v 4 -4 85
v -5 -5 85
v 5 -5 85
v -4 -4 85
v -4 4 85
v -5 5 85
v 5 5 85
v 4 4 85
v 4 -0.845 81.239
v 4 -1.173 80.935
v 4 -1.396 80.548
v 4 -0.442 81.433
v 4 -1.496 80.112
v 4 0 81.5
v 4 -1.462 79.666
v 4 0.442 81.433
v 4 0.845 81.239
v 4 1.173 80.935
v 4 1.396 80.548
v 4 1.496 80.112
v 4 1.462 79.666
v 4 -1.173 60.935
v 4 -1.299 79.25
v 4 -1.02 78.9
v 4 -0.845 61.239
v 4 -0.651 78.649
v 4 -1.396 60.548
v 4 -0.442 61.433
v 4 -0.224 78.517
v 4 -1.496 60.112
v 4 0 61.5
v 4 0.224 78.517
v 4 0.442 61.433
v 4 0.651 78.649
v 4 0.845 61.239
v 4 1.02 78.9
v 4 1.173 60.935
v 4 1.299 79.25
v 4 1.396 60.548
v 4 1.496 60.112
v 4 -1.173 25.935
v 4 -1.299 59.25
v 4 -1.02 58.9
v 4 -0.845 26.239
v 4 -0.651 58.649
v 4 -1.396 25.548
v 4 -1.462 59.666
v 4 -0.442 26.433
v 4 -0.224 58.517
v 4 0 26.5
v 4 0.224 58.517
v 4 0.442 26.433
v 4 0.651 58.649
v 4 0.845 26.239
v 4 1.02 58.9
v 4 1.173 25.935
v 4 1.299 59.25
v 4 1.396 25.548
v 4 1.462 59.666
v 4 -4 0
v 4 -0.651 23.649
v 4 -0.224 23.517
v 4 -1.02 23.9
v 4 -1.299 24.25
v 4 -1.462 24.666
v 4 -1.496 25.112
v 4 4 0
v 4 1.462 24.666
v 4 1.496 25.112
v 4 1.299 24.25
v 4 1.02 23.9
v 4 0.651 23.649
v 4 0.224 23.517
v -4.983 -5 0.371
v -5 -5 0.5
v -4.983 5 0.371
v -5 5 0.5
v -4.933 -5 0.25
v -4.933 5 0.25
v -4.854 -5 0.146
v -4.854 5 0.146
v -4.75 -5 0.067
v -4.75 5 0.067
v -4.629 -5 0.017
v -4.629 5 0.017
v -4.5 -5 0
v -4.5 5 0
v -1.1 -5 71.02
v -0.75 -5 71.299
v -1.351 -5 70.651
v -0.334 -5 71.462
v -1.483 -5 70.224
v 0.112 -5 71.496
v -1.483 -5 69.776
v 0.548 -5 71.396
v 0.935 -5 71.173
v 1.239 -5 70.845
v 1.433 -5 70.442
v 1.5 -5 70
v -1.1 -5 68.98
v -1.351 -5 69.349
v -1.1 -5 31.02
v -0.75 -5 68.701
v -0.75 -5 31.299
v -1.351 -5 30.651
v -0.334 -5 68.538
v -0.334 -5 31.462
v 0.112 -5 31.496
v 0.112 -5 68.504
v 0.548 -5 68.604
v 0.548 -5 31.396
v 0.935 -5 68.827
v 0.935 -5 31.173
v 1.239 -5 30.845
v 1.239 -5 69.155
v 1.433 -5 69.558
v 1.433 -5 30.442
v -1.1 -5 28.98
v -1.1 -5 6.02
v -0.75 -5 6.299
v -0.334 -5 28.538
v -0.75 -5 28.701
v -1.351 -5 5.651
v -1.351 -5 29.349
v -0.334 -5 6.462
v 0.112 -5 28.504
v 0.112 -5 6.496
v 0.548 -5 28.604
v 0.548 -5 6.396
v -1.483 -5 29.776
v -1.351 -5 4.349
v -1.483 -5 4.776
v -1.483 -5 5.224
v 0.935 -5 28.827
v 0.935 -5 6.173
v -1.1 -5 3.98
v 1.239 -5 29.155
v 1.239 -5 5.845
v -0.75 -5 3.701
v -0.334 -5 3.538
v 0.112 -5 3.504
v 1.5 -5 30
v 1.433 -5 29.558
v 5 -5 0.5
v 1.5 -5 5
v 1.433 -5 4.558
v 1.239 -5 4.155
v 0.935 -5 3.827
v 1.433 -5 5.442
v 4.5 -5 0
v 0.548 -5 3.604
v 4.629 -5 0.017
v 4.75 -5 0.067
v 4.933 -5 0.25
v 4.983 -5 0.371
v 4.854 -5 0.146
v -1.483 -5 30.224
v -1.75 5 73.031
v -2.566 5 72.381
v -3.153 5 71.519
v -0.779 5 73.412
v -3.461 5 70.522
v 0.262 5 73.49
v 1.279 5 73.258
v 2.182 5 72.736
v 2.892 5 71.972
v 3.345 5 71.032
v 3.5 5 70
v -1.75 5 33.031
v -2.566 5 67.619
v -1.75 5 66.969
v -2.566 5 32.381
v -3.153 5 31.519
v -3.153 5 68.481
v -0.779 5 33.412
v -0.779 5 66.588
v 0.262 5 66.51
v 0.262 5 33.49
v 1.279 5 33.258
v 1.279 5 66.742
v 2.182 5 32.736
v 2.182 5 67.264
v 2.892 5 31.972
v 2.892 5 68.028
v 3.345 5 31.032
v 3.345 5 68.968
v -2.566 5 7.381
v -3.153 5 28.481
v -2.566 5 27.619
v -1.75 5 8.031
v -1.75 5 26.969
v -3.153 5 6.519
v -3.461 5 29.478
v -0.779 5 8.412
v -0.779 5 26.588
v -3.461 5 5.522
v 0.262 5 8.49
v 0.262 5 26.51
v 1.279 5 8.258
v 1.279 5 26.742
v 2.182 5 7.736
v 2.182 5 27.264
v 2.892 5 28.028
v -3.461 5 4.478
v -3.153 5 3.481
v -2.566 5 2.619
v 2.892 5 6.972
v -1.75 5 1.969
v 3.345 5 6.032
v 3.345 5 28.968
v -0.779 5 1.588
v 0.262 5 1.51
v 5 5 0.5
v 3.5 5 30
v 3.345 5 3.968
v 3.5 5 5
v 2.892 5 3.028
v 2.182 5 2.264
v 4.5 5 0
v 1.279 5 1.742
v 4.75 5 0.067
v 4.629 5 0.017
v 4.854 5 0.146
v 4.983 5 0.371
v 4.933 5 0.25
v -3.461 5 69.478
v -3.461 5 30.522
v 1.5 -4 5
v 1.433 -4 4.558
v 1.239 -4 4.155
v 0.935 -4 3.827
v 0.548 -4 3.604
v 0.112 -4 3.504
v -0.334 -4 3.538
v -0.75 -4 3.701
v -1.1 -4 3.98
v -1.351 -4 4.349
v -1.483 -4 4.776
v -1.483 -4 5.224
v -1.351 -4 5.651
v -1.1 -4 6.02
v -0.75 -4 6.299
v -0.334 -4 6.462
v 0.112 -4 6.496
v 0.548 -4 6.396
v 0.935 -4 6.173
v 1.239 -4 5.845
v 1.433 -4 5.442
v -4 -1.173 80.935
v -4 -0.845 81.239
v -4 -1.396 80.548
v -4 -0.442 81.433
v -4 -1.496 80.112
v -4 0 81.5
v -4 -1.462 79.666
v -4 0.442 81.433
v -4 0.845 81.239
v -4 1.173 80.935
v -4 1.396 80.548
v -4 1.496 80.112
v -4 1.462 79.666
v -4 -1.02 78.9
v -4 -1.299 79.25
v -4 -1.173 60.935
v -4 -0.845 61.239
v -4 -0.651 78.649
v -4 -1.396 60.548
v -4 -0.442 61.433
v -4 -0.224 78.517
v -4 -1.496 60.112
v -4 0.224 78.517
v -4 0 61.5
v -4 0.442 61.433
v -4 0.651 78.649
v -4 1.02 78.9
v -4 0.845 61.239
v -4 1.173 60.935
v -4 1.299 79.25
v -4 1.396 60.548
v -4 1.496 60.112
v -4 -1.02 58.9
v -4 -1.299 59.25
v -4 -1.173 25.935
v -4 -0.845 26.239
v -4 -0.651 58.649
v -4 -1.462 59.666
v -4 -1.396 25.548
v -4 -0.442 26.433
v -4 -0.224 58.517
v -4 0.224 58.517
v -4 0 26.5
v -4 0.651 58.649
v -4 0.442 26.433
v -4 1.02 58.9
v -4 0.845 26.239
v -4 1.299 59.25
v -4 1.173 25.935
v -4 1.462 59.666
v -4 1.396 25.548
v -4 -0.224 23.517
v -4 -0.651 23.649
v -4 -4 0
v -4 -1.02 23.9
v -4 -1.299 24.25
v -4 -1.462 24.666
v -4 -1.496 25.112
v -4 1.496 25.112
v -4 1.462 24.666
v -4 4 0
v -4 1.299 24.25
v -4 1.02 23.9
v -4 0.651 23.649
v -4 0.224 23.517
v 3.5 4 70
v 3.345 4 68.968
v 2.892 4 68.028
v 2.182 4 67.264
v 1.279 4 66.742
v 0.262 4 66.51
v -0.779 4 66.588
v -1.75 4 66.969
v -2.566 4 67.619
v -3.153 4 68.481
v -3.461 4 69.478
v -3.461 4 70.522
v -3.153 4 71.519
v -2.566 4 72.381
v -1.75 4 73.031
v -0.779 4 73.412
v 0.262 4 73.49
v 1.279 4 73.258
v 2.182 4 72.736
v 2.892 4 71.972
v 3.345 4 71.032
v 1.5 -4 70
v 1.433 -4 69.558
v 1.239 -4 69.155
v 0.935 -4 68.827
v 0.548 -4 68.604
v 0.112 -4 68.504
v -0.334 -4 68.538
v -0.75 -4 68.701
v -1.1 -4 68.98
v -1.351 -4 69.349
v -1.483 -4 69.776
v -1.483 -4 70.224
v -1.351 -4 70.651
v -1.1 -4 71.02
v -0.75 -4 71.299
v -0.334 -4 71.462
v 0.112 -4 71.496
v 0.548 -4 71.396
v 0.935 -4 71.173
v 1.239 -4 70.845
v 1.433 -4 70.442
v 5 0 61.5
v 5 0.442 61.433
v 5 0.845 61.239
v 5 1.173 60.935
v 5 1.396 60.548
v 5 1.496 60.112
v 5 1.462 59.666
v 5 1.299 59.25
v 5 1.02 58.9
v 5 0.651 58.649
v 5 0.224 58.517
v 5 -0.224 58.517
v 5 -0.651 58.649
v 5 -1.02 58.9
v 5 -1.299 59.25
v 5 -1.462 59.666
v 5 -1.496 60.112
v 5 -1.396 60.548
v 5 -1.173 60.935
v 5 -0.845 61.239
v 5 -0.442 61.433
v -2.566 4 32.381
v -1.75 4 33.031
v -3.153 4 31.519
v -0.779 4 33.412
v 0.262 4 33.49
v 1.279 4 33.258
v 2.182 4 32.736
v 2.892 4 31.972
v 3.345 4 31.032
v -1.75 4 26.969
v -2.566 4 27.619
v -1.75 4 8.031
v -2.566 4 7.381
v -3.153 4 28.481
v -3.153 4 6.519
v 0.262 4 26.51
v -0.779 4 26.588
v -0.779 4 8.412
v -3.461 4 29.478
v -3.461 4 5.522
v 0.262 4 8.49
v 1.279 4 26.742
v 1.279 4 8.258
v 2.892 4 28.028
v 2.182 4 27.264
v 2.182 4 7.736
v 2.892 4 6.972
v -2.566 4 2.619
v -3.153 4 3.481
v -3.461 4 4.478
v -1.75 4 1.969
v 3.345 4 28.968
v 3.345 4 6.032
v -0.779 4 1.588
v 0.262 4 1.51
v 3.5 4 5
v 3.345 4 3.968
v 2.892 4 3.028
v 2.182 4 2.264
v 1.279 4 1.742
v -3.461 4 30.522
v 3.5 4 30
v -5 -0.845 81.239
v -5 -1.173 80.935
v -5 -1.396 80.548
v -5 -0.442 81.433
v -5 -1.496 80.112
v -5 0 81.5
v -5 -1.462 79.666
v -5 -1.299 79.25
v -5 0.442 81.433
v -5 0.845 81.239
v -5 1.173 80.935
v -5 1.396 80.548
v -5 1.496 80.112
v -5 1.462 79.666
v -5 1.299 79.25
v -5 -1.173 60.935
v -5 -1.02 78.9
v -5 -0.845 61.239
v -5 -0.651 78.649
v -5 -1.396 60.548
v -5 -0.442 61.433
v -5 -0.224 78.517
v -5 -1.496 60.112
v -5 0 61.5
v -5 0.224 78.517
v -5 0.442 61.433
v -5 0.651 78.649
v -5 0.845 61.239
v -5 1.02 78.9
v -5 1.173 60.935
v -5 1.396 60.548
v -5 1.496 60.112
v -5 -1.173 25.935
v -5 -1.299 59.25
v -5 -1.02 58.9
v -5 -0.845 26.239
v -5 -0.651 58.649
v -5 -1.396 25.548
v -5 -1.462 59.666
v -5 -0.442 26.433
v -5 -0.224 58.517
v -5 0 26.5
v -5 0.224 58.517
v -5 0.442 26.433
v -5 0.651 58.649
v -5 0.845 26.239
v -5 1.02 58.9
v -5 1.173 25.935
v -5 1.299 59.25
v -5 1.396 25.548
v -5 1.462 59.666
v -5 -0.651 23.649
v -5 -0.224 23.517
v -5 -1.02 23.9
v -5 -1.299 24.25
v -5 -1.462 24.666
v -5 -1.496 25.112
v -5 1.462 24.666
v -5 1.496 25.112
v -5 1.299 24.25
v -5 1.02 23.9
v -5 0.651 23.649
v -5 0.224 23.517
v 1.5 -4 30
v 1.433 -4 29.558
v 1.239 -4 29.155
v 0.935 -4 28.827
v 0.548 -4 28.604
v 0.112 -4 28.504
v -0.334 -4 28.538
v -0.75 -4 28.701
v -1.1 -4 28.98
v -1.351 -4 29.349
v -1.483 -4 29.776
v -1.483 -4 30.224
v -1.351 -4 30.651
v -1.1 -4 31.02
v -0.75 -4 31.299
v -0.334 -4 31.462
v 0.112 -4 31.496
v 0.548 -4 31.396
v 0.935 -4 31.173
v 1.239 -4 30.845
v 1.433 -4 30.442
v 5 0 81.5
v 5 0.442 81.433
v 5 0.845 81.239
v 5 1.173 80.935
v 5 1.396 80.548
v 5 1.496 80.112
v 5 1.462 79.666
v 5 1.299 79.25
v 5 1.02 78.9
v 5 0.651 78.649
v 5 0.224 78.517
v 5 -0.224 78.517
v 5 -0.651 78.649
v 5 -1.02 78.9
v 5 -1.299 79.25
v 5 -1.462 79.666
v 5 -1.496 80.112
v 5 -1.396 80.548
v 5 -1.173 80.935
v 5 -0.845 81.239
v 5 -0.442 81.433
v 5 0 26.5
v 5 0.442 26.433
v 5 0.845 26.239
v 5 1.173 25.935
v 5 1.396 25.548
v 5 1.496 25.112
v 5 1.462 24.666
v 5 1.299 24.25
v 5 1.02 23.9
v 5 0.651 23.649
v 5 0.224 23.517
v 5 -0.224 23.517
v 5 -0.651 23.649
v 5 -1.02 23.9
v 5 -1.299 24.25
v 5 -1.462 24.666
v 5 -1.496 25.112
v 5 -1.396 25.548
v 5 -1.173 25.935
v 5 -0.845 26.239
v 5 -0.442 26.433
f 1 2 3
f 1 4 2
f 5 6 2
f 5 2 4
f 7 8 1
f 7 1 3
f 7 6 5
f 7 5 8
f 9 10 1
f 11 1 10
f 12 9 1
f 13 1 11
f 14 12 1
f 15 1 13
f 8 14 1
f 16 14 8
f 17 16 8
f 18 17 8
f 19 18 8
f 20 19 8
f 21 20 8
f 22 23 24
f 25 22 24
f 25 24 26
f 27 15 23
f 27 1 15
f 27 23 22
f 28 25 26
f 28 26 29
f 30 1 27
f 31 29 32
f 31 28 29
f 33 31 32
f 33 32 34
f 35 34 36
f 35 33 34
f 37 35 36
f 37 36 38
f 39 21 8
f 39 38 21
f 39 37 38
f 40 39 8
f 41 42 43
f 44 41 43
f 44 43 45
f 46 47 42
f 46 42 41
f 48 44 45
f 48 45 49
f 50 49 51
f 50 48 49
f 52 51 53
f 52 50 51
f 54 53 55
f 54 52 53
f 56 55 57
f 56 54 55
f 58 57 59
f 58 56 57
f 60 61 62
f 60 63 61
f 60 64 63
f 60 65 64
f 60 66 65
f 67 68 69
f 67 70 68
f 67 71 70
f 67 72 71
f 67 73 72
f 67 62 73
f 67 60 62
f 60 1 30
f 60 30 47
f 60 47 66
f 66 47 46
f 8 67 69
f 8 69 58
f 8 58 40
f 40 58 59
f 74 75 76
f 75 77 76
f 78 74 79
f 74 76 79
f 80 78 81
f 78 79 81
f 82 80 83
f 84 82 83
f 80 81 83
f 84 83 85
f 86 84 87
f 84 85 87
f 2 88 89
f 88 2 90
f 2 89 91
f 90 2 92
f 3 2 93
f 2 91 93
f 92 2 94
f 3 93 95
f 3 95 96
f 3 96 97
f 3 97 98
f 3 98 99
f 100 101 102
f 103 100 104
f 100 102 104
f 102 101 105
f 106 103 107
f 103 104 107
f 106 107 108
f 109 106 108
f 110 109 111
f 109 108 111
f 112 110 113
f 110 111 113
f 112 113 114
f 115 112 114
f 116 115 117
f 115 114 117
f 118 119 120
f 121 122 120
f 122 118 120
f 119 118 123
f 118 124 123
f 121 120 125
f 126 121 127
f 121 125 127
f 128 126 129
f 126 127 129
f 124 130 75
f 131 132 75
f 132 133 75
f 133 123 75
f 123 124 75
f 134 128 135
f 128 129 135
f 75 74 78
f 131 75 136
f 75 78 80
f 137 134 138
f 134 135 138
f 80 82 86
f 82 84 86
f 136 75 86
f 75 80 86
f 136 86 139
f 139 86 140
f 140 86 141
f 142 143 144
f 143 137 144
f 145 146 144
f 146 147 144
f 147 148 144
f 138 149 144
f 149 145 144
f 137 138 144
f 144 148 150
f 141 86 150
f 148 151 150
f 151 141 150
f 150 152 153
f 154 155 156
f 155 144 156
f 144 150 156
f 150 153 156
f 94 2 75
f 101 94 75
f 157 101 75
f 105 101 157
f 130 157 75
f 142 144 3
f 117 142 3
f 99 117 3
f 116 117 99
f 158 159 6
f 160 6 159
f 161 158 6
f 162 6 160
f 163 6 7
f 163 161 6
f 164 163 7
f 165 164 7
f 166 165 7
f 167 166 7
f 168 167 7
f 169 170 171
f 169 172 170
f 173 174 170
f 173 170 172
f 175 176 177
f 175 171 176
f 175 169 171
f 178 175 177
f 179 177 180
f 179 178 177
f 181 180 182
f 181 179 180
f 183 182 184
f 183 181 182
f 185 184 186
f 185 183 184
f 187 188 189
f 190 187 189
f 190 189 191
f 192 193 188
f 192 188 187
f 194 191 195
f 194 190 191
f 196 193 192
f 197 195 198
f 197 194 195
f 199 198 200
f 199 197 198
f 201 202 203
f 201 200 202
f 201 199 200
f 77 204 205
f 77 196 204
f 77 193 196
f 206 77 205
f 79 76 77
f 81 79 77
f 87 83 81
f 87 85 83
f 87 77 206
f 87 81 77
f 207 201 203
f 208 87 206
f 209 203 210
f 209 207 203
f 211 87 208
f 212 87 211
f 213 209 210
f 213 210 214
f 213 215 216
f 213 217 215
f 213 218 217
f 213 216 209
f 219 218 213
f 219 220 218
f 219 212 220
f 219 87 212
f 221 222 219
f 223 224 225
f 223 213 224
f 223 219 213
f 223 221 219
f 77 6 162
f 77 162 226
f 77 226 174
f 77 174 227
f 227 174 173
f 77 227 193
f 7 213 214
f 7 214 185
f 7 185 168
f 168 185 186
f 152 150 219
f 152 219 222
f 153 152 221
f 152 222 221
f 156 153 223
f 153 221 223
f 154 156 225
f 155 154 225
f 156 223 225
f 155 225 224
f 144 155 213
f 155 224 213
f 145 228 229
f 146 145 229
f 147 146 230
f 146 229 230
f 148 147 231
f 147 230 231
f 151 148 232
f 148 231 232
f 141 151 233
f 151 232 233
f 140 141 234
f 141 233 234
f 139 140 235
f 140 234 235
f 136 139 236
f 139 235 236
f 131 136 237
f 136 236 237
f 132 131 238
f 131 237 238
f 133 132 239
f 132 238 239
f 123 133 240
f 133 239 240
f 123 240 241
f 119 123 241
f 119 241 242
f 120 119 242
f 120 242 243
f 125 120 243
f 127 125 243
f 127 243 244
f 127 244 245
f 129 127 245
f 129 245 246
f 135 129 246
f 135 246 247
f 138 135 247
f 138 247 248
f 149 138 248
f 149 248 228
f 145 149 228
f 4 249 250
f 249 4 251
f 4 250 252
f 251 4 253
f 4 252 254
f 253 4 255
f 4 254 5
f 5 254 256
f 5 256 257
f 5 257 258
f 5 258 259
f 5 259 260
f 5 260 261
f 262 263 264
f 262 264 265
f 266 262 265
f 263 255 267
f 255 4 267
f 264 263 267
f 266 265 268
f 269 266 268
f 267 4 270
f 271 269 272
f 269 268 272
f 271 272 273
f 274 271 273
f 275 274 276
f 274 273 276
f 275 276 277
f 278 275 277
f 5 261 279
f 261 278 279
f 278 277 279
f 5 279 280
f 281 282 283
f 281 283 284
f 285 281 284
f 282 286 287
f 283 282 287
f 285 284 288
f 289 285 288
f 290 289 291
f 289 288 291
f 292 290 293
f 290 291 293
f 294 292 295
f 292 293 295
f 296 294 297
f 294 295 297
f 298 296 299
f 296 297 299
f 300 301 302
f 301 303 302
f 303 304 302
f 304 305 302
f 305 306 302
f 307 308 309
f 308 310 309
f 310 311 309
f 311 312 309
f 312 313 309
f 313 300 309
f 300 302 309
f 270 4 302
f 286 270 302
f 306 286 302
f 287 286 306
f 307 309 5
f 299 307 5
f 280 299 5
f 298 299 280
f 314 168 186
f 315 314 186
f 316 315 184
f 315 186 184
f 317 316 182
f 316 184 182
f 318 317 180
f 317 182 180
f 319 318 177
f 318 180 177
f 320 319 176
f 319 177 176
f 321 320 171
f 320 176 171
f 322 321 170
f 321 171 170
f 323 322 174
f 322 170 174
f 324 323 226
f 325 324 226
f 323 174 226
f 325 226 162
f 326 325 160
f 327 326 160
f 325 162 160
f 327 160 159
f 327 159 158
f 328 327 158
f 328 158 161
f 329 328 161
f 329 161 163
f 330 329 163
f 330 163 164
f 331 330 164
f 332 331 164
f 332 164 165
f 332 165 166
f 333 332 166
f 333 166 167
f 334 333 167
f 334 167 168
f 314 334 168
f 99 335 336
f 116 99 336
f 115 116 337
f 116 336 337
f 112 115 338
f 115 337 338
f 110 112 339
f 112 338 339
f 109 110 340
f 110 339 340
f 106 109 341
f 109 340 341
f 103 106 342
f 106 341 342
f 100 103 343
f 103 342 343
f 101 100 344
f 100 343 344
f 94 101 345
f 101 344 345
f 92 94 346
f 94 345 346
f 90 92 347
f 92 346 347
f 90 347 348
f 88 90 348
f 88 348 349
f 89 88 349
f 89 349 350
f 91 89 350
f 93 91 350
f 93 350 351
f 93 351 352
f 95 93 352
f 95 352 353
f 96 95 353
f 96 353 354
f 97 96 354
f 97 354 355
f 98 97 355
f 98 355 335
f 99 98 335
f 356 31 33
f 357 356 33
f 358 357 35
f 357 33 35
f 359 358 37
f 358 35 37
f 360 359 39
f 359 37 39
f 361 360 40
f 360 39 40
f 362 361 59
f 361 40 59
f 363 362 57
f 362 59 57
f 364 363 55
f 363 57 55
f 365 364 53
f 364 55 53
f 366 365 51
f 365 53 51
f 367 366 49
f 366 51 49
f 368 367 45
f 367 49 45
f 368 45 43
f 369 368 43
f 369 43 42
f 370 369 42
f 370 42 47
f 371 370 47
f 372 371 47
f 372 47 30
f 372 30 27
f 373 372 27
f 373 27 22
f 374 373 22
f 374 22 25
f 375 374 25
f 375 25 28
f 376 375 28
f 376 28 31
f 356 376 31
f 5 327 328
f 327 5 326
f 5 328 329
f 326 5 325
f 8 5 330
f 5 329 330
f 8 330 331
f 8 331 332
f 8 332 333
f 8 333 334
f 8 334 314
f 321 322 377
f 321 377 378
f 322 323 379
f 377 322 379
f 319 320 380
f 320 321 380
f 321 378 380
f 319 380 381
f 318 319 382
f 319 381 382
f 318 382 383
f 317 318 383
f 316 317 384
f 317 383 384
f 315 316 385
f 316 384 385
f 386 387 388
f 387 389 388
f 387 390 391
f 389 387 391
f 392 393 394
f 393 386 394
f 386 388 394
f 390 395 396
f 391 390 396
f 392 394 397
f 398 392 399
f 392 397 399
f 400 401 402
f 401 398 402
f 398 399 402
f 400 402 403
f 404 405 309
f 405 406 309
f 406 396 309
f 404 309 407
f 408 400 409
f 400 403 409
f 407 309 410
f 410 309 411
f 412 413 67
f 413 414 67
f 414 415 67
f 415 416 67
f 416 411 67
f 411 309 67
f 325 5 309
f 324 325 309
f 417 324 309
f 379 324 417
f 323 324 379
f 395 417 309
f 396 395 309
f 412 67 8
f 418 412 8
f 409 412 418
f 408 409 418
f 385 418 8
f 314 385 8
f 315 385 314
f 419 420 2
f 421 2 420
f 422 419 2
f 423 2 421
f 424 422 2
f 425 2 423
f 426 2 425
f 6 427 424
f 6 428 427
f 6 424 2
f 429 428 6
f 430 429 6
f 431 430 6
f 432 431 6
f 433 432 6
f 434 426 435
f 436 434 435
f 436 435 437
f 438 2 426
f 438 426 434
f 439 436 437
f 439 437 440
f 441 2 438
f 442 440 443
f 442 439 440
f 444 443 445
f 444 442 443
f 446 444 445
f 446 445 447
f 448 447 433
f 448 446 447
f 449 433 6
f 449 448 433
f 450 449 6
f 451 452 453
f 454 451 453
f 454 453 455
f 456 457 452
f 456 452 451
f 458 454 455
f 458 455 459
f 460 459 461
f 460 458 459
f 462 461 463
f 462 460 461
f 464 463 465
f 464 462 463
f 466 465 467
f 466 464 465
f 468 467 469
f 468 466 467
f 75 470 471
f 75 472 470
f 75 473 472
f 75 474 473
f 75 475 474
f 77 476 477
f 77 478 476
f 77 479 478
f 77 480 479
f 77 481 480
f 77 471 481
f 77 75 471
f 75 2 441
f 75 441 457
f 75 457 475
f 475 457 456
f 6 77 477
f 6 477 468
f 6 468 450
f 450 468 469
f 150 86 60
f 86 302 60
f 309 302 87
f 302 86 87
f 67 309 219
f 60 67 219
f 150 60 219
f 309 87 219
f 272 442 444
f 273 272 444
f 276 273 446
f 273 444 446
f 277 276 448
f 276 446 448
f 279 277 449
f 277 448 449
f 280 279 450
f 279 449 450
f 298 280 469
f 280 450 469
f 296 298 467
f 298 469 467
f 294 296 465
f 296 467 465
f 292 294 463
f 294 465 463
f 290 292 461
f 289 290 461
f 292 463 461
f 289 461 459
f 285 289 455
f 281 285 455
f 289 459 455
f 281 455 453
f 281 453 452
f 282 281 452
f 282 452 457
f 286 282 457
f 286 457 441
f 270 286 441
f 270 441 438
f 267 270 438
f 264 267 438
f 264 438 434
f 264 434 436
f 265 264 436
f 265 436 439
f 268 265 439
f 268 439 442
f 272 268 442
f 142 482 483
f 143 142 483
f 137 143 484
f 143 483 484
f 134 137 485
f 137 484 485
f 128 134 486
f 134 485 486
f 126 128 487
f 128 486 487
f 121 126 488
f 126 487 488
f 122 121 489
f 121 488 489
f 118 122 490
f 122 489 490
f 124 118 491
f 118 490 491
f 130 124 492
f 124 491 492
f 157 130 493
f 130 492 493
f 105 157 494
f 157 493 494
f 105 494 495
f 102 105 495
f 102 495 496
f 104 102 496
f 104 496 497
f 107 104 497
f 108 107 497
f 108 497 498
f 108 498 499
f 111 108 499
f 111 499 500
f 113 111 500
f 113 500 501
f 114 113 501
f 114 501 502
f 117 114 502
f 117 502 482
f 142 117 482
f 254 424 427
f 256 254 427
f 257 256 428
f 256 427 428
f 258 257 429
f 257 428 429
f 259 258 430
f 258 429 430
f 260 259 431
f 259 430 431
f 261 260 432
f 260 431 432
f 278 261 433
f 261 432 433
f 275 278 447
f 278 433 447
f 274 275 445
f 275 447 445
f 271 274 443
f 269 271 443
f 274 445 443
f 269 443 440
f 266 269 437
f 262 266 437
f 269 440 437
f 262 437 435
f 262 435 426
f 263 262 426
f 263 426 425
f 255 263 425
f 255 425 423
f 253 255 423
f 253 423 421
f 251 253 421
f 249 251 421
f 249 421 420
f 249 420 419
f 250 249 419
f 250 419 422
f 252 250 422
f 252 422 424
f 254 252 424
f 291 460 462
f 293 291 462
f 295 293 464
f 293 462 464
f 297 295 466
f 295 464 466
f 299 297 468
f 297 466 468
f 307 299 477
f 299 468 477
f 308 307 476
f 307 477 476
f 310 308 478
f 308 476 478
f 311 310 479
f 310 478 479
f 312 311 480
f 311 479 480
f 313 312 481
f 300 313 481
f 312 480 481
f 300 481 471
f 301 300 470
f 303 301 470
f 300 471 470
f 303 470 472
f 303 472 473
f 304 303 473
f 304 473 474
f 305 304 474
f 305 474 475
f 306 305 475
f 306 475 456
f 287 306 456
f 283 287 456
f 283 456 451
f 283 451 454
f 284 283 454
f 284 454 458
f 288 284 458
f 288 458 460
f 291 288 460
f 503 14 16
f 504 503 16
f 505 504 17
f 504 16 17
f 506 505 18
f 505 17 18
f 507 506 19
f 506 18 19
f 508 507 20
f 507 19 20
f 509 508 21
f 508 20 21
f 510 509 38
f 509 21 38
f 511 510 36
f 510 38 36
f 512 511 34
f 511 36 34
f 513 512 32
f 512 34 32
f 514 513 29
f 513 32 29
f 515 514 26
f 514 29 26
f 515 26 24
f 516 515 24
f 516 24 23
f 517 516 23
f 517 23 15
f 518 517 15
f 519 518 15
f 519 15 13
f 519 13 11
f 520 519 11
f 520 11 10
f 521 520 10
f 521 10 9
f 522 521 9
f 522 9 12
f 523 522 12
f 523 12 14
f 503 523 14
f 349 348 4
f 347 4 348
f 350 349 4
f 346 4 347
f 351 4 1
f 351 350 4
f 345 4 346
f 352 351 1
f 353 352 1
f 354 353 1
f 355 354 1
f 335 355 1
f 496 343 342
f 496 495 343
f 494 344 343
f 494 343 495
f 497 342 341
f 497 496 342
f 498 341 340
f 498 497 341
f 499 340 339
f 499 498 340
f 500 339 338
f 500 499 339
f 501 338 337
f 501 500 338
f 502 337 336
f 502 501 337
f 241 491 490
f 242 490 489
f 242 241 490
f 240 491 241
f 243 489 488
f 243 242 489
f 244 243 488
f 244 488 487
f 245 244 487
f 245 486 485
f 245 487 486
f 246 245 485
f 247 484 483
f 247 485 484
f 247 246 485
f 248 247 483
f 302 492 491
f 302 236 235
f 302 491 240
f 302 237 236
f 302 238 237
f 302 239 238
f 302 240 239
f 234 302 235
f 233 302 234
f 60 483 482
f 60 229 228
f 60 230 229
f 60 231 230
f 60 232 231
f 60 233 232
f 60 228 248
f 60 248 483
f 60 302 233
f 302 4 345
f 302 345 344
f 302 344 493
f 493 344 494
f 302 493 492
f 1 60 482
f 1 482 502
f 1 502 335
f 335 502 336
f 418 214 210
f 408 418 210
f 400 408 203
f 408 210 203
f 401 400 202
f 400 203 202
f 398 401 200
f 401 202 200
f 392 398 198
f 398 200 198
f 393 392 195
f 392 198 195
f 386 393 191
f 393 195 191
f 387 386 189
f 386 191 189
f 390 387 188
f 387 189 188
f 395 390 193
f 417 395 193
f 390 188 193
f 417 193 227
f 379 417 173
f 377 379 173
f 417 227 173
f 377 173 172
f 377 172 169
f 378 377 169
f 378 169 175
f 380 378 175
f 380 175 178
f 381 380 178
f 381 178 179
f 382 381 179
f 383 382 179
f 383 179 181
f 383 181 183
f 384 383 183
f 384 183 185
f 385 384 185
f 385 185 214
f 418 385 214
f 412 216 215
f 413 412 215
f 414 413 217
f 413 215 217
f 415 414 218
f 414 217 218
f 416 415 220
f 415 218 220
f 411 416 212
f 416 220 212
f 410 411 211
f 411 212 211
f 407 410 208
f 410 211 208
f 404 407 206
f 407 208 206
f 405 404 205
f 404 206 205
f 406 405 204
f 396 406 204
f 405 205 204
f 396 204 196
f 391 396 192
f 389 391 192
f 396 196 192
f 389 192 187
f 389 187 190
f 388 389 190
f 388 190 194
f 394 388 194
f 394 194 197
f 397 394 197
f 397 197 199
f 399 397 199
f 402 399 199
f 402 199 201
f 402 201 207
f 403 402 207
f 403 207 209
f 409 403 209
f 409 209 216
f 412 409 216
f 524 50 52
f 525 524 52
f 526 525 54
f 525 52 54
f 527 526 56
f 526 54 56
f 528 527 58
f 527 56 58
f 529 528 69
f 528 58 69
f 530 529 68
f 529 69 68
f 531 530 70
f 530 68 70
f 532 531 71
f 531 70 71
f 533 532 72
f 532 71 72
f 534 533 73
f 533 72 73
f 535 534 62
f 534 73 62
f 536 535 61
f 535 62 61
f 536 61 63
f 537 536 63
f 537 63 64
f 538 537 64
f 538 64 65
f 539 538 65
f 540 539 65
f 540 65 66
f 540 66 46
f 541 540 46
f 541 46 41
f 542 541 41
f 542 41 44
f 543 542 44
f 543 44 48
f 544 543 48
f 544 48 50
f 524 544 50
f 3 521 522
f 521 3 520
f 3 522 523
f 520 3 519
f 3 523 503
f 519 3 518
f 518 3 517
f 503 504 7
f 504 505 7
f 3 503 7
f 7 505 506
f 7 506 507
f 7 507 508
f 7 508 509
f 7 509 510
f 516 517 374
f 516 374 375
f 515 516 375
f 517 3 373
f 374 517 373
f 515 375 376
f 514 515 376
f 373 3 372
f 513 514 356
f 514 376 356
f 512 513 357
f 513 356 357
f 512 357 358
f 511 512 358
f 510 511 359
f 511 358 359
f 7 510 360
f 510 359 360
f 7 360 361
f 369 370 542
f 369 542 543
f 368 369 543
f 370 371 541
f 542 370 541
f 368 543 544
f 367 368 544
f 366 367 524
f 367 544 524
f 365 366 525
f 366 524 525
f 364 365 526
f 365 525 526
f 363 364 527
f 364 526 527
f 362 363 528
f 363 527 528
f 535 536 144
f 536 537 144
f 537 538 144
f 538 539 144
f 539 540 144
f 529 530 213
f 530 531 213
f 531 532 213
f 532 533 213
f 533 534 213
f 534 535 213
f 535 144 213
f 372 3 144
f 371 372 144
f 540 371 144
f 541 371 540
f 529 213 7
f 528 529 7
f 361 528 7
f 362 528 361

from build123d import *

# Parameters (mm, degrees)
SKETCH_1_W          = 10
SKETCH_1_H          = 10
SKETCH_1_W_2        = 8
SKETCH_1_H_2        = 8
EXTRUDE_1_DEPTH     = 85
SKETCH_2_R          = 1.5
CUT_EXTRUDE_1_DEPTH = 11
SKETCH_3_R          = 1.5
CUT_EXTRUDE_2_DEPTH = 10
SKETCH_4_R          = 3.5
CUT_EXTRUDE_3_DEPTH = 5
FILLET_1_R          = 0.5


with BuildPart() as part:
    # 草图1 → 拉伸-薄壁1 (new body)
    with BuildSketch(Plane.XY):
        Rectangle(SKETCH_1_W, SKETCH_1_H)
        Rectangle(SKETCH_1_W_2, SKETCH_1_H_2, mode=Mode.SUBTRACT)
    extrude(amount=EXTRUDE_1_DEPTH)

    # 草图2 → 切除-拉伸1 (cut, through all)
    with BuildSketch(Plane(origin=(0, 5, 0), x_dir=(1, 0, 0), z_dir=(0, 1, 0))):
        with Locations((0, -70)):
            Circle(SKETCH_2_R)
        with Locations((0, -5)):
            Circle(SKETCH_2_R)
        with Locations((0, -30)):
            Circle(SKETCH_2_R)
    extrude(amount=-CUT_EXTRUDE_1_DEPTH, mode=Mode.SUBTRACT)

    # 草图3 → 切除-拉伸2 (cut)
    with BuildSketch(Plane.ZY.offset(5)):
        with Locations((25, 0)):
            Circle(SKETCH_3_R)
        with Locations((60, 0)):
            Circle(SKETCH_3_R)
        with Locations((80, 0)):
            Circle(SKETCH_3_R)
    extrude(amount=-CUT_EXTRUDE_2_DEPTH, mode=Mode.SUBTRACT)

    # 草图4 → 切除-拉伸3 (cut)
    with BuildSketch(Plane(origin=(0, 5, 0), x_dir=(1, 0, 0), z_dir=(0, 1, 0))):
        with Locations((0, -5)):
            Circle(SKETCH_4_R)
        with Locations((0, -30)):
            Circle(SKETCH_4_R)
        with Locations((0, -70)):
            Circle(SKETCH_4_R)
    extrude(amount=-CUT_EXTRUDE_3_DEPTH, mode=Mode.SUBTRACT)

    # 圆角1
    fillet_1_edges = [part.edges().sort_by_distance(p)[0] for p in [
        (5, 0, 0),
        (-5, 0, 0),
    ]]
    fillet(fillet_1_edges, radius=FILLET_1_R)


solid = part.part
